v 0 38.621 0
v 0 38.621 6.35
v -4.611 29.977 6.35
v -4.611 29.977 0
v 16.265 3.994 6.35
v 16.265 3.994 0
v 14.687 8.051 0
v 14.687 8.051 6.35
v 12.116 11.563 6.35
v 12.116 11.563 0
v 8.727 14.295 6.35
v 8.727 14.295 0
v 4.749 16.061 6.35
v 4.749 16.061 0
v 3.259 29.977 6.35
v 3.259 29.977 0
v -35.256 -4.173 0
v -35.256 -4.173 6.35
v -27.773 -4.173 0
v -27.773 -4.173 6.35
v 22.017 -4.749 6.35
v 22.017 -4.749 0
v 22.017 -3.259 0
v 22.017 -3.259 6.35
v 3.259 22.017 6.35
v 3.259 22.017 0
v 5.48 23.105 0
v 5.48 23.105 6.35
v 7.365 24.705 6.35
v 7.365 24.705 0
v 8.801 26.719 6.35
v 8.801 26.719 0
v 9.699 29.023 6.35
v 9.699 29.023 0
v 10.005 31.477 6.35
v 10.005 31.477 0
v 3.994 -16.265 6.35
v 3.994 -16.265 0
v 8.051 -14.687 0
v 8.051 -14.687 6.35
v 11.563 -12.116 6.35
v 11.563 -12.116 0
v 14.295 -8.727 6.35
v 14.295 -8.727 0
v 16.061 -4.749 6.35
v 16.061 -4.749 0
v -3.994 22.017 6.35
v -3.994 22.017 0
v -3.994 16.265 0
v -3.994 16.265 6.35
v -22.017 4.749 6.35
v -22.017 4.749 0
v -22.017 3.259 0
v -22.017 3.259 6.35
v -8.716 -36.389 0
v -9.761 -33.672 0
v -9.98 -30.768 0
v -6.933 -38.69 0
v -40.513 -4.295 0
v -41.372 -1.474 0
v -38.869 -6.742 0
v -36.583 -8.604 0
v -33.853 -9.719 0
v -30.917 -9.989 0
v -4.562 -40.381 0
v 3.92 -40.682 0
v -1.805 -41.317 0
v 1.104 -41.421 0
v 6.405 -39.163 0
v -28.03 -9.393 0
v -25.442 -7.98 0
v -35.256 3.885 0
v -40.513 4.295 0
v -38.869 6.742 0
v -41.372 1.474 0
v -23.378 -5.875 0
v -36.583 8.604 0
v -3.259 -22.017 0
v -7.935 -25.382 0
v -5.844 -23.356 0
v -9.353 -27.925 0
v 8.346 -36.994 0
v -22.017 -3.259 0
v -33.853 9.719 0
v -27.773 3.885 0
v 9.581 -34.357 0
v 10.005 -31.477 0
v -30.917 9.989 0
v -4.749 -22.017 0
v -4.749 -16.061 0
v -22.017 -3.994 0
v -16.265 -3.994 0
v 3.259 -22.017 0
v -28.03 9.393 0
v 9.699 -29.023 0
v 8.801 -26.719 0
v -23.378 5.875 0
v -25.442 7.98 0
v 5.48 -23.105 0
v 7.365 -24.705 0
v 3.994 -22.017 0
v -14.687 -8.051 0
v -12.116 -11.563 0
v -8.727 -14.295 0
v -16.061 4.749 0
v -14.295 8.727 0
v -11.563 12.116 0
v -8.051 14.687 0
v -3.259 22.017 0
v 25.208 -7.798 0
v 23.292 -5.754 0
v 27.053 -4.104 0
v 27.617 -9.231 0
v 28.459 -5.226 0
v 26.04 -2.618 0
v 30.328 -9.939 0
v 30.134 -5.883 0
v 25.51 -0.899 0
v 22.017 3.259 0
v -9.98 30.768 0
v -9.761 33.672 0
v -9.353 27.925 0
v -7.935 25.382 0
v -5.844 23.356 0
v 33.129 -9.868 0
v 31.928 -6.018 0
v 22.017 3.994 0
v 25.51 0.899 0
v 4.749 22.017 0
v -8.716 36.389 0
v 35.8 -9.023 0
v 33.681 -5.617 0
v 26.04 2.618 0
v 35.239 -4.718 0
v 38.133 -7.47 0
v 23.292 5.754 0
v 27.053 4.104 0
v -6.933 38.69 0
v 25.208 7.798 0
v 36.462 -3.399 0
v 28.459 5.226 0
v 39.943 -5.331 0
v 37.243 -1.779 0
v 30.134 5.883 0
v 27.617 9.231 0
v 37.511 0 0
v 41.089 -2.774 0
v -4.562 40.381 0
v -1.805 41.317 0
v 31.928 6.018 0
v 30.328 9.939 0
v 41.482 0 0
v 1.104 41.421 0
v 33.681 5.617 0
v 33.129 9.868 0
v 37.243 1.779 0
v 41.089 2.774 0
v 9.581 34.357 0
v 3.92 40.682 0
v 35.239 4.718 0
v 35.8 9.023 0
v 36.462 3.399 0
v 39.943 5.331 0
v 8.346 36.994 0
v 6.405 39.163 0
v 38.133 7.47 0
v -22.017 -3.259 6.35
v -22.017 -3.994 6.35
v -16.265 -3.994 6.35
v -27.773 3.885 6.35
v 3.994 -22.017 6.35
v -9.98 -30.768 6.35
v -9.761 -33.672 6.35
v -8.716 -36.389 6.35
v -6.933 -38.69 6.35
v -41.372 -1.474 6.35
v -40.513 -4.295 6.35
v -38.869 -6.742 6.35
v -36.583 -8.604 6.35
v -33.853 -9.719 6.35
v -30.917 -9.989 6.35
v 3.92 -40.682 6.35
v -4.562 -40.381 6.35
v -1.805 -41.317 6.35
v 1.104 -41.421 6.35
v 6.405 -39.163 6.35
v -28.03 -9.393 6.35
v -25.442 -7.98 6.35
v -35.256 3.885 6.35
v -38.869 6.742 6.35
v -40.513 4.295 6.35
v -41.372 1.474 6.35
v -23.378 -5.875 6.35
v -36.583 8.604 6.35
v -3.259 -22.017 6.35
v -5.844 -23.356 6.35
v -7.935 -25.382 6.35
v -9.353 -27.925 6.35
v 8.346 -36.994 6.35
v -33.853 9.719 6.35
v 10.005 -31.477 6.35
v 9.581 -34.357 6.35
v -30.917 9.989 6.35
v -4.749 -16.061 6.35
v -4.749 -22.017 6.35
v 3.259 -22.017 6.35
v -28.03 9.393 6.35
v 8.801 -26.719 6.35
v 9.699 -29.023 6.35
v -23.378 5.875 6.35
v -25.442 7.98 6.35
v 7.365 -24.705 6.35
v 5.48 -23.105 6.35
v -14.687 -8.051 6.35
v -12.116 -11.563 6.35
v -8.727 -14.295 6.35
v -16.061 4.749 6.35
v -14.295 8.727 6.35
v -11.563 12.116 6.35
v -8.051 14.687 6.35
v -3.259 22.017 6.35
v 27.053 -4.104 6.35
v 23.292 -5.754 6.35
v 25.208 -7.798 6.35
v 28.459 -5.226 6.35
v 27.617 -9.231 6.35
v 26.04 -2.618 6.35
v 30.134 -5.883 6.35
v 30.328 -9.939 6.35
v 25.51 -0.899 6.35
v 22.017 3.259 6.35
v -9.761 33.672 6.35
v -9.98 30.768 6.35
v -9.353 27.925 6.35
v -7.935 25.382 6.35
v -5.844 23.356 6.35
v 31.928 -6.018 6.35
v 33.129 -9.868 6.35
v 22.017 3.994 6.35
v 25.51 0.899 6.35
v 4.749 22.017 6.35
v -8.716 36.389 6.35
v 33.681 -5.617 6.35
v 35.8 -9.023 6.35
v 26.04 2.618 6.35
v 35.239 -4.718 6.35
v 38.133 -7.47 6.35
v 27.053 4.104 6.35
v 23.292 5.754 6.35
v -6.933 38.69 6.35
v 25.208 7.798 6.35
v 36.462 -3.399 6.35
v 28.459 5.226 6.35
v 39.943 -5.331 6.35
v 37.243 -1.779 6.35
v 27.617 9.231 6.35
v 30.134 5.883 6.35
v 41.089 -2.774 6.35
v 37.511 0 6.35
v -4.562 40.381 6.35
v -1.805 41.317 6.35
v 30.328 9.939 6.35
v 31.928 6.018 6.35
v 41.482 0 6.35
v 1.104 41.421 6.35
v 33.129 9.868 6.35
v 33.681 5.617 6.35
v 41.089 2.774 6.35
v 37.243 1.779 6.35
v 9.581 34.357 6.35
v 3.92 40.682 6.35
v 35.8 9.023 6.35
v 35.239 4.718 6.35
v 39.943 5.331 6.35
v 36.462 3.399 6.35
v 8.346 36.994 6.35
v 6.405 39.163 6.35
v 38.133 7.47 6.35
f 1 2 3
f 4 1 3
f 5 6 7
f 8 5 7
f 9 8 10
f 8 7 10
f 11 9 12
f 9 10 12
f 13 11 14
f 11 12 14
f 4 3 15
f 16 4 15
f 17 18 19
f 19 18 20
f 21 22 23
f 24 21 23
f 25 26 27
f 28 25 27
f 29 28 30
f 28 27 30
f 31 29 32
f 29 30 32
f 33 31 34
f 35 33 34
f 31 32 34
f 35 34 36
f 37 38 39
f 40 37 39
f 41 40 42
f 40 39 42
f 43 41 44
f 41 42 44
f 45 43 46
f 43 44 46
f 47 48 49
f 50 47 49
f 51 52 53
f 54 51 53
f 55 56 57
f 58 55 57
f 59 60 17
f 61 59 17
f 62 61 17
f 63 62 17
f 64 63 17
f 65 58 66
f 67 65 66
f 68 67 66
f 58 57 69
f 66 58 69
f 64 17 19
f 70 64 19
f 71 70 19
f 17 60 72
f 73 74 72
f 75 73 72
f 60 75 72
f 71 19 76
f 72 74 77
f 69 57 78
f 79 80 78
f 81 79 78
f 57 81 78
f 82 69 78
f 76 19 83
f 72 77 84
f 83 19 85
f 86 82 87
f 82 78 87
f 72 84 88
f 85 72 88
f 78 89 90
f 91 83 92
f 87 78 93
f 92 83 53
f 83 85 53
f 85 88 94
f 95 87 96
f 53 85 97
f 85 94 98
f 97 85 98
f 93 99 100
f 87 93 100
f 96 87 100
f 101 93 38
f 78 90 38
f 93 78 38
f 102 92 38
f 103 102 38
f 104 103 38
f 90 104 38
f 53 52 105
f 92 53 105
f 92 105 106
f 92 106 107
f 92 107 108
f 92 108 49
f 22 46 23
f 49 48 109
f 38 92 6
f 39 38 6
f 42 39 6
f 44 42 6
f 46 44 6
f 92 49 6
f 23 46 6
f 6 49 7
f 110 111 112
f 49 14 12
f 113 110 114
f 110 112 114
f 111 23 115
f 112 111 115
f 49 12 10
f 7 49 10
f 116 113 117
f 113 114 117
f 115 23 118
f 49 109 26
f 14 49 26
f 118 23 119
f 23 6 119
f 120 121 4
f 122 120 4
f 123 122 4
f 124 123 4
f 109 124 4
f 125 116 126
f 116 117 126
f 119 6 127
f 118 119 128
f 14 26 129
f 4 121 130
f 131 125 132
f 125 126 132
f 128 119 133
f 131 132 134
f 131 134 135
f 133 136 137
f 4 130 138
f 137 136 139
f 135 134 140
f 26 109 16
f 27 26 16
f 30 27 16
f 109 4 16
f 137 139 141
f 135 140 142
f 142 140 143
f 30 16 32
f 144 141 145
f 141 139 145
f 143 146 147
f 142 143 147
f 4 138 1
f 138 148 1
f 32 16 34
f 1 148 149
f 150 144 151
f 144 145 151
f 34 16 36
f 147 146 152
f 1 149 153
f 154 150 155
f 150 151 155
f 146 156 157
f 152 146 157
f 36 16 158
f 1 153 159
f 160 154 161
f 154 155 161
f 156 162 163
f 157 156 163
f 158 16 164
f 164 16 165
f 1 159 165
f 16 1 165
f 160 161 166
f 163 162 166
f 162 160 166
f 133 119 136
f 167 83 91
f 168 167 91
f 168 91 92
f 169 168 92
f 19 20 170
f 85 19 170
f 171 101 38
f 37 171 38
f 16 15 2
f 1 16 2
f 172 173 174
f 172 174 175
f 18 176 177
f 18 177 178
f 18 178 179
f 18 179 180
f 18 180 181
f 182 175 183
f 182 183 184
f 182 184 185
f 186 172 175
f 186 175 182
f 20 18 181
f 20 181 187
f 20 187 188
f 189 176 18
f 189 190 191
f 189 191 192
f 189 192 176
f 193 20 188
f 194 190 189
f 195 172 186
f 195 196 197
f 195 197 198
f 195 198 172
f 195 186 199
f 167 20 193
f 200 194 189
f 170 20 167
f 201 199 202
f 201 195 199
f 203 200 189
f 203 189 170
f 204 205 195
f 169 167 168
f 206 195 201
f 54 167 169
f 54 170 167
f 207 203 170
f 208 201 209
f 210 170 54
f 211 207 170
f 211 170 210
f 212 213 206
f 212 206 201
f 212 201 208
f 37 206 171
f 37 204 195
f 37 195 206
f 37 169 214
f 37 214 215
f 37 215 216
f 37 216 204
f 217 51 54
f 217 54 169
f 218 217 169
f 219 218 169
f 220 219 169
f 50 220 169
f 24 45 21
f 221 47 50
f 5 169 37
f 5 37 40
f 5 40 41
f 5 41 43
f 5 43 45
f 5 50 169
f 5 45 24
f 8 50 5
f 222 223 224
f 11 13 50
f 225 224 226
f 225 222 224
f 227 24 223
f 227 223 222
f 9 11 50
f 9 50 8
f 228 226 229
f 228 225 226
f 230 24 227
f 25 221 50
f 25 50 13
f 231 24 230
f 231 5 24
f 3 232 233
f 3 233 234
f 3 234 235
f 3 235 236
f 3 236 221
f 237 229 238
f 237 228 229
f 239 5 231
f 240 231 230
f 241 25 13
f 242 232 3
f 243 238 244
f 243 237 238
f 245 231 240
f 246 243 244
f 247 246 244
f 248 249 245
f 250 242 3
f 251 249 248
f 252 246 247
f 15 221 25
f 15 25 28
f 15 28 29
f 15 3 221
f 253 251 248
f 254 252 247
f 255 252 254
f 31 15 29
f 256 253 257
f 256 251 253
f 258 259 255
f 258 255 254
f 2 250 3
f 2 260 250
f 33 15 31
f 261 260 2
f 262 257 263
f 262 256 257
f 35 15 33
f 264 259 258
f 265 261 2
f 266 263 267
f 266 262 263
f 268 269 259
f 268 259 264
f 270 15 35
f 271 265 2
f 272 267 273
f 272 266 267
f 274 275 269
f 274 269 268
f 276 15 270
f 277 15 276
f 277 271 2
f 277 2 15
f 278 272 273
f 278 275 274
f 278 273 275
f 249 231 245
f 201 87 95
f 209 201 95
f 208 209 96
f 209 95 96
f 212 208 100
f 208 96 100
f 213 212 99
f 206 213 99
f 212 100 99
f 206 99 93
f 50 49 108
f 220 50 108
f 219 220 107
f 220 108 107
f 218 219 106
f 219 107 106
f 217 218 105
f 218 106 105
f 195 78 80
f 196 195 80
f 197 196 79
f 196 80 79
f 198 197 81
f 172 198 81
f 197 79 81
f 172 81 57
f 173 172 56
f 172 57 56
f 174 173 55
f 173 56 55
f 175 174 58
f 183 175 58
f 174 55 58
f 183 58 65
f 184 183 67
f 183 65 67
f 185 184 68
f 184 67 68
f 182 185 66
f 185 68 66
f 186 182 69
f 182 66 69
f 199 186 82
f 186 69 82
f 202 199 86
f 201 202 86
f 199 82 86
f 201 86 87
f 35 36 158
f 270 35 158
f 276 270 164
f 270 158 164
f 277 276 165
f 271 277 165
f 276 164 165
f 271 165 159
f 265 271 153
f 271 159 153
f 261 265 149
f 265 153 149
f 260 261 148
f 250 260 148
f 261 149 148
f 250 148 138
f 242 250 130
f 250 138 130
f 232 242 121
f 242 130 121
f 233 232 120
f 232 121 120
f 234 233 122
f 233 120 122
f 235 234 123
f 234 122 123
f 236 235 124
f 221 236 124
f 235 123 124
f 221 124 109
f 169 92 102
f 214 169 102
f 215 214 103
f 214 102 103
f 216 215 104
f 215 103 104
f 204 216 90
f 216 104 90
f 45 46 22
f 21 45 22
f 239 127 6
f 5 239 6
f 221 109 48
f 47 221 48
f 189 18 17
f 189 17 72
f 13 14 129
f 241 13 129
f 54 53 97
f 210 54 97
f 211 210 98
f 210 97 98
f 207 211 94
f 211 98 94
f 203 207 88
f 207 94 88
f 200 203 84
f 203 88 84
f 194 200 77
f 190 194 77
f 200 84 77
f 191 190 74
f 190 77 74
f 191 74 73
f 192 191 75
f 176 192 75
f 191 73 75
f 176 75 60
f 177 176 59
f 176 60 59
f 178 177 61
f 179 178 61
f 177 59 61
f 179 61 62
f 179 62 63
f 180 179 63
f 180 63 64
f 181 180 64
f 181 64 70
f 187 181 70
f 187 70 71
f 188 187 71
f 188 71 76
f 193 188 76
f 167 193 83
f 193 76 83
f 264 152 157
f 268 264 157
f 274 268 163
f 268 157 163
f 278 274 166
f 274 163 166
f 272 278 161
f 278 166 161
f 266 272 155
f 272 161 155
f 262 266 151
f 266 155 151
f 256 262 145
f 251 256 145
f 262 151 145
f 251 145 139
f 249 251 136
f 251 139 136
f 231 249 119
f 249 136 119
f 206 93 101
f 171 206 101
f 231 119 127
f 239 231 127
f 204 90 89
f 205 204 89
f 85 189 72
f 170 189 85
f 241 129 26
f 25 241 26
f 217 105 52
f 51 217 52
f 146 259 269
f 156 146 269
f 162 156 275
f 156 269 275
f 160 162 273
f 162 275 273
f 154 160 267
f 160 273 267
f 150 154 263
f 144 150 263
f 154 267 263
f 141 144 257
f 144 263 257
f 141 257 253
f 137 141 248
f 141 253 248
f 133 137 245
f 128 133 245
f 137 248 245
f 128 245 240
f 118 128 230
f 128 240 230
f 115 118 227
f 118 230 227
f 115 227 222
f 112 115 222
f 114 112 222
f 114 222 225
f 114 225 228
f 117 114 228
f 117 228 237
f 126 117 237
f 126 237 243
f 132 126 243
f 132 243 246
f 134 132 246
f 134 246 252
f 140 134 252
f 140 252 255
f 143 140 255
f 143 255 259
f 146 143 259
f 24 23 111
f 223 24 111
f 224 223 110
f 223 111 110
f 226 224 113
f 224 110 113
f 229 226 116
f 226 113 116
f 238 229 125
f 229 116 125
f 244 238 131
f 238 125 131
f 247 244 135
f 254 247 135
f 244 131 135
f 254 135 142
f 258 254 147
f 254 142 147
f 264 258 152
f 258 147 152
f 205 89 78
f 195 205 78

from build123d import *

# Parameters (mm, degrees)
F1_DEPTH = 6.35
F2_W     = 7.482951507
F2_H     = 8.058561245
F3_DEPTH = 59.436
F2_R     = 6.0344313248
F4_DEPTH = 108.458


with BuildPart() as f1:
    # F0 (on Top) → F1 (new body)
    with BuildSketch(Plane.XY):
        with BuildLine():
            ThreePointArc((16.061134272, -4.7487956472), (16.5757420089, -2.3991396488), (16.7484654282, 0))
            ThreePointArc((16.7484654282, 0), (16.627209939, 2.0117116707), (16.2651992014, 3.9942945733))
            Line((16.2651992014, 3.9942945733), (16.061134272, -4.7487956472))
        make_face()
        with BuildLine():
            ThreePointArc((16.2651992014, 3.9942945733), (16.627209939, 2.0117116707), (16.7484654282, 0))
            ThreePointArc((16.7484654282, 0), (16.5757420089, -2.3991396488), (16.061134272, -4.7487956472))
            Line((16.061134272, -4.7487956472), (22.0171436027, -4.7487956472))
            Line((22.0171436027, -4.7487956472), (22.0171436027, -3.2589072692))
            ThreePointArc((22.0171436027, -3.2589072692), (21.4715103831, 0), (22.0171436027, 3.2589072692))
            Line((22.0171436027, 3.2589072692), (22.0171436027, 3.9942945733))
            Line((22.0171436027, 3.9942945733), (16.2651992014, 3.9942945733))
        make_face()
        with BuildLine():
            Line((16.061134272, -4.7487956472), (16.2651992014, 3.9942945733))
            ThreePointArc((16.2651992014, 3.9942945733), (12.1160699054, 11.5633880956), (4.7487956472, 16.061134272))
            Line((4.7487956472, 16.061134272), (-3.9942945733, 16.2651992014))
            ThreePointArc((-3.9942945733, 16.2651992014), (-11.5633880956, 12.1160699054), (-16.061134272, 4.7487956472))
            Line((-16.061134272, 4.7487956472), (-16.2651992014, -3.9942945733))
            ThreePointArc((-16.2651992014, -3.9942945733), (-12.1160699054, -11.5633880956), (-4.7487956472, -16.061134272))
            Line((-4.7487956472, -16.061134272), (3.9942945733, -16.2651992014))
            ThreePointArc((3.9942945733, -16.2651992014), (11.5633880956, -12.1160699054), (16.061134272, -4.7487956472))
        make_face()
        with BuildLine():
            Line((-3.9942945733, 16.2651992014), (4.7487956472, 16.061134272))
            ThreePointArc((4.7487956472, 16.061134272), (0.3908050556, 16.7439053273), (-3.9942945733, 16.2651992014))
        make_face()
        with BuildLine():
            ThreePointArc((-3.9942945733, 16.2651992014), (0.3908050556, 16.7439053273), (4.7487956472, 16.061134272))
            Line((4.7487956472, 16.061134272), (4.7487956472, 22.0171436027))
            Line((4.7487956472, 22.0171436027), (3.2589072692, 22.0171436027))
            ThreePointArc((3.2589072692, 22.0171436027), (0, 21.4715103831), (-3.2589072692, 22.0171436027))
            Line((-3.2589072692, 22.0171436027), (-3.9942945733, 22.0171436027))
            Line((-3.9942945733, 22.0171436027), (-3.9942945733, 16.2651992014))
        make_face()
        with BuildLine():
            Line((3.9942945733, -22.0171436027), (3.9942945733, -16.2651992014))
            ThreePointArc((3.9942945733, -16.2651992014), (-0.3908050556, -16.7439053273), (-4.7487956472, -16.061134272))
            Line((-4.7487956472, -16.061134272), (-4.7487956472, -22.0171436027))
            Line((-4.7487956472, -22.0171436027), (-3.2589072692, -22.0171436027))
            ThreePointArc((-3.2589072692, -22.0171436027), (0, -21.4715103831), (3.2589072692, -22.0171436027))
            Line((3.2589072692, -22.0171436027), (3.9942945733, -22.0171436027))
        make_face()
        with BuildLine():
            ThreePointArc((-4.7487956472, -16.061134272), (-0.3908050556, -16.7439053273), (3.9942945733, -16.2651992014))
            Line((3.9942945733, -16.2651992014), (-4.7487956472, -16.061134272))
        make_face()
        with BuildLine():
            ThreePointArc((41.4816413794, 0), (33.1287102734, 9.8677144047), (22.0171436027, 3.2589072692))
            Line((22.0171436027, 3.2589072692), (22.0171436027, -3.2589072692))
            ThreePointArc((22.0171436027, -3.2589072692), (33.1287102734, -9.8677144047), (41.4816413794, 0))
        make_face()
        with BuildLine():
            Line((22.0171436027, -3.2589072692), (22.0171436027, 3.2589072692))
            ThreePointArc((22.0171436027, 3.2589072692), (21.4715103831, 0), (22.0171436027, -3.2589072692))
        make_face()
        with BuildLine():
            Line((-16.2651992014, -3.9942945733), (-16.061134272, 4.7487956472))
            ThreePointArc((-16.061134272, 4.7487956472), (-16.7439053273, 0.3908050556), (-16.2651992014, -3.9942945733))
        make_face()
        with BuildLine():
            ThreePointArc((-16.2651992014, -3.9942945733), (-16.7439053273, 0.3908050556), (-16.061134272, 4.7487956472))
            Line((-16.061134272, 4.7487956472), (-22.0171436027, 4.7487956472))
            Line((-22.0171436027, 4.7487956472), (-22.0171436027, 3.2589072692))
            ThreePointArc((-22.0171436027, 3.2589072692), (-21.6088614766, 1.6521343922), (-21.4715103831, 0))
            ThreePointArc((-21.4715103831, 0), (-21.6088614766, -1.6521343922), (-22.0171436027, -3.2589072692))
            Line((-22.0171436027, -3.2589072692), (-22.0171436027, -3.9942945733))
            Line((-22.0171436027, -3.9942945733), (-16.2651992014, -3.9942945733))
        make_face()
        with BuildLine():
            ThreePointArc((-3.2589072692, 22.0171436027), (0, 21.4715103831), (3.2589072692, 22.0171436027))
            Line((3.2589072692, 22.0171436027), (-3.2589072692, 22.0171436027))
        make_face()
        with BuildLine():
            Line((-3.2589072692, 22.0171436027), (3.2589072692, 22.0171436027))
            ThreePointArc((3.2589072692, 22.0171436027), (8.1457632025, 25.667283543), (10.0050654981, 31.4765758812))
            ThreePointArc((10.0050654981, 31.4765758812), (-5.8092923382, 39.6223390837), (-3.2589072692, 22.0171436027))
        make_face()
        with BuildLine():
            ThreePointArc((10.0050654981, -31.4765758812), (8.1457632025, -25.667283543), (3.2589072692, -22.0171436027))
            Line((3.2589072692, -22.0171436027), (-3.2589072692, -22.0171436027))
            ThreePointArc((-3.2589072692, -22.0171436027), (-5.8092923382, -39.6223390837), (10.0050654981, -31.4765758812))
        make_face()
        with BuildLine():
            Line((-3.2589072692, -22.0171436027), (3.2589072692, -22.0171436027))
            ThreePointArc((3.2589072692, -22.0171436027), (0, -21.4715103831), (-3.2589072692, -22.0171436027))
        make_face()
        with BuildLine():
            ThreePointArc((-21.4715103831, 0), (-21.6088614766, 1.6521343922), (-22.0171436027, 3.2589072692))
            Line((-22.0171436027, 3.2589072692), (-22.0171436027, -3.2589072692))
            ThreePointArc((-22.0171436027, -3.2589072692), (-21.6088614766, -1.6521343922), (-21.4715103831, 0))
        make_face()
        with BuildLine():
            Line((-22.0171436027, -3.2589072692), (-22.0171436027, 3.2589072692))
            ThreePointArc((-22.0171436027, 3.2589072692), (-41.4816413794, 0), (-22.0171436027, -3.2589072692))
        make_face()
    extrude(amount=F1_DEPTH)

    # F2 (on face) → F3 (cut)
    with BuildSketch(Plane.XY.offset(6.35)):
        with Locations((-31.5147312358, -0.1439027255)):
            Rectangle(F2_W, F2_H)
    extrude(amount=-F3_DEPTH, mode=Mode.SUBTRACT)

    # F2 (on face) → F4 (cut)
    with BuildSketch(Plane.XY.offset(6.35)):
        with Locations((31.4765758812, 0)):
            Circle(F2_R)
        Polygon((3.2589072692, 29.9774594605), (0, 38.620531559), (-4.6109691992, 29.9774594605), align=None)
    extrude(amount=-F4_DEPTH, mode=Mode.SUBTRACT)


solid = f1.part
